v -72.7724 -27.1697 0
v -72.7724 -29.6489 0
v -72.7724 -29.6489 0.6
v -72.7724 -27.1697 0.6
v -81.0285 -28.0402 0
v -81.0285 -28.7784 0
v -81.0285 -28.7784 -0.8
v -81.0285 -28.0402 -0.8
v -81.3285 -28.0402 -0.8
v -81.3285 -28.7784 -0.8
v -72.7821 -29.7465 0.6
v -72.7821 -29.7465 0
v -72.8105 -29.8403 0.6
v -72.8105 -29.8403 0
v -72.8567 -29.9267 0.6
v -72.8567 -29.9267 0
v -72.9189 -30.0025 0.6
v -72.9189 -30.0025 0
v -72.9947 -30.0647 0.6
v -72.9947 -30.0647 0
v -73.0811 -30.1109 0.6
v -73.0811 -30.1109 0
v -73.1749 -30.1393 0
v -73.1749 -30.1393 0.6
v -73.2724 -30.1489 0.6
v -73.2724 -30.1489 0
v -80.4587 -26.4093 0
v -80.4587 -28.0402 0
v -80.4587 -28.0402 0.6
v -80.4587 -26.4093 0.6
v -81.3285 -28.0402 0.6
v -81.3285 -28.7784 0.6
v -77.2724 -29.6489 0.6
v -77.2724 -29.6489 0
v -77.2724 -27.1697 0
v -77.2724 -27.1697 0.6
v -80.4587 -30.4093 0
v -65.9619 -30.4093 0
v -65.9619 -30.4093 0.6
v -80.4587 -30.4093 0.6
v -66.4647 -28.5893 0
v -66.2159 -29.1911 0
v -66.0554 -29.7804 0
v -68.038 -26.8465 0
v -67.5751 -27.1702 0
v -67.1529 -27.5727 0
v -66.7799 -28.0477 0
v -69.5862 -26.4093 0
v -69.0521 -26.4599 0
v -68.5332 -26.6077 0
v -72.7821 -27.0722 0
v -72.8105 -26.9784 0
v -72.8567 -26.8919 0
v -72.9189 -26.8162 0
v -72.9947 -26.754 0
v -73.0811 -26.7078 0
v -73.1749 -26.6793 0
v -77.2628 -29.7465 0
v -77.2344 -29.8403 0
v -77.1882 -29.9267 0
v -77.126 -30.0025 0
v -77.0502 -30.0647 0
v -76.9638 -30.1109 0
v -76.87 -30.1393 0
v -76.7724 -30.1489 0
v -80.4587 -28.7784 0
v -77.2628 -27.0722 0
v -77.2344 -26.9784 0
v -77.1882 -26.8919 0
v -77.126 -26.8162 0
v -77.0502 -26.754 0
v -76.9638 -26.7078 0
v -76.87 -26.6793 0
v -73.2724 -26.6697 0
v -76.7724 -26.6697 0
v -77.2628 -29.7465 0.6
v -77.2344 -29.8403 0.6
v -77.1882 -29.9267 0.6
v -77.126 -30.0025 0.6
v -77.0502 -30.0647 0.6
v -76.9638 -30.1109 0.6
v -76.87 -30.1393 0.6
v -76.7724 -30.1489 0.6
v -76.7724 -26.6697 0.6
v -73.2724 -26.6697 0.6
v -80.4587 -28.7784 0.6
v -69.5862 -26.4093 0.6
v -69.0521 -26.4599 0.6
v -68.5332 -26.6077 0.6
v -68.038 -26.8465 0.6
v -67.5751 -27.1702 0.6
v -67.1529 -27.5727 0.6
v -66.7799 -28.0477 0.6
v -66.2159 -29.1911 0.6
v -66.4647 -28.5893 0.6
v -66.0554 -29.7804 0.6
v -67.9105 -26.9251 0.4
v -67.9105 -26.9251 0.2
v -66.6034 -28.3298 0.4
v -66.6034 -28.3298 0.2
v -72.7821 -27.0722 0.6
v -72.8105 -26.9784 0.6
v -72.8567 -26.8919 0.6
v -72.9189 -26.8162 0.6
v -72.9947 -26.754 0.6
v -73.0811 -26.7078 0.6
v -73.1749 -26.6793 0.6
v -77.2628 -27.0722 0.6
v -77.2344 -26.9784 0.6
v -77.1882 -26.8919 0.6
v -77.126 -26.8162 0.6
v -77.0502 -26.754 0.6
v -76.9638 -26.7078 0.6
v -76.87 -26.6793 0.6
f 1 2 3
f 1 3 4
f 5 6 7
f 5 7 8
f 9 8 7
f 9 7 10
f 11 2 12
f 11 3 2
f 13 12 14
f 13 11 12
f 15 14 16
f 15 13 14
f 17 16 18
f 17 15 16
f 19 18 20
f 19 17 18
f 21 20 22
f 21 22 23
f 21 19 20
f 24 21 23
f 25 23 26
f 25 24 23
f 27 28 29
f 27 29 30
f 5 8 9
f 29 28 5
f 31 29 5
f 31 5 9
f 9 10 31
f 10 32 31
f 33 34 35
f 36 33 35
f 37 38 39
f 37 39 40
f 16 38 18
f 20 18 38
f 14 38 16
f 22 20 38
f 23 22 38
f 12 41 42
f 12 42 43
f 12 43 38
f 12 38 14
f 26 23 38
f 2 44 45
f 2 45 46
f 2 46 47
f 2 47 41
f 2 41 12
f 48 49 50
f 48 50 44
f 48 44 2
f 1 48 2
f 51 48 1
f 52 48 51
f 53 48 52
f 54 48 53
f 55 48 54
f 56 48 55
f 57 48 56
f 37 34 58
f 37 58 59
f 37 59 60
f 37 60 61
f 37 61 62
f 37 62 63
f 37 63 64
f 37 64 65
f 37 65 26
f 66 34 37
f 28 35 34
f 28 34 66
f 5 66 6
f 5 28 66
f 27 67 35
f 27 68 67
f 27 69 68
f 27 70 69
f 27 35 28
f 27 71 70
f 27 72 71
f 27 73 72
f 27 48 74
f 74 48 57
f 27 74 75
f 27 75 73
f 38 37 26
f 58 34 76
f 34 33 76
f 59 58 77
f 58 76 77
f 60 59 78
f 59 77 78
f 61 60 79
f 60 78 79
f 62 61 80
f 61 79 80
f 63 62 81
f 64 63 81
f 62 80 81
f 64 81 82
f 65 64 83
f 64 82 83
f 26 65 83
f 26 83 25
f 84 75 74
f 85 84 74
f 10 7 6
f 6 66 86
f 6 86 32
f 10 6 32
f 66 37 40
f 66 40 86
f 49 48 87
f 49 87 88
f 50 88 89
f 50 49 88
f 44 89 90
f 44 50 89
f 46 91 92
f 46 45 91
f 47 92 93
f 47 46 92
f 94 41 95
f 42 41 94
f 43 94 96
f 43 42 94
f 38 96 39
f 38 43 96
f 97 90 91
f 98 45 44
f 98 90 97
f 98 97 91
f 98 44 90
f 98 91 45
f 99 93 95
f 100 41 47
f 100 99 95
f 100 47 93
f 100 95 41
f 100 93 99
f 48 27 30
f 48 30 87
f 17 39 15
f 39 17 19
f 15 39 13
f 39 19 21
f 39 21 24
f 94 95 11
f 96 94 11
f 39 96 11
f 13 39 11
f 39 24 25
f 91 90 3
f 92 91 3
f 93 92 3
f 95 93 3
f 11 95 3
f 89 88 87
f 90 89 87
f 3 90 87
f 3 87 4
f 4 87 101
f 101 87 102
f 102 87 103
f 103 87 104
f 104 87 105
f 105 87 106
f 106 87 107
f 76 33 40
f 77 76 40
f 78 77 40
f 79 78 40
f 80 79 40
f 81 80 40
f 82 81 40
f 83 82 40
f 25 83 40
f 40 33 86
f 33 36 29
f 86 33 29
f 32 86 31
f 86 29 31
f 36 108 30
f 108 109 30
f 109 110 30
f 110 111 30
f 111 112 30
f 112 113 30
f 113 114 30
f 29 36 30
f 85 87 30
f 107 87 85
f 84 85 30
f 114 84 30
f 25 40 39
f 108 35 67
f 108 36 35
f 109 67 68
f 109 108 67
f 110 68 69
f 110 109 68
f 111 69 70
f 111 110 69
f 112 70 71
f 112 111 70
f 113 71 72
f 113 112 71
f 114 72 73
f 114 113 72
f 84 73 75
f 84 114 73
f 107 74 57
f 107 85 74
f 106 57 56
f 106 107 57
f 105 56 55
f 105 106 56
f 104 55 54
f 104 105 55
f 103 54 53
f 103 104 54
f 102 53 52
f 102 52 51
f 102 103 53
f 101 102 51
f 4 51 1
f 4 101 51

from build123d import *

# Parameters (mm, degrees)
CROQUIS1_W              = 4.5
CROQUIS1_H              = 3.47922044
SALIENTE_EXTRUIR1_DEPTH = 0.6
REDONDEO1_R             = 0.5
CROQUIS2_W              = 0.3
CROQUIS2_H              = 0.738230838
SALIENTE_EXTRUIR2_DEPTH = 0.8


with BuildPart() as part:
    # Croquis1 → Saliente-Extruir1 (new body)
    with BuildSketch(Plane.XY):
        with BuildLine():
            Line((-80.458731062, -26.409325636), (-69.586167188, -26.409325636))
            add(Edge.make_bspline(
                [(-69.586167188, -26.409325636), (-67.825300142, -26.409325636), (-66.171601872, -28.063804878), (-65.9618826, -30.409325636)],
                knots=[0, 0, 0, 0, 1, 1, 1, 1], degree=3))
            Line((-65.9618826, -30.409325636), (-69.586167188, -30.409325636))
            Line((-69.586167188, -30.409325636), (-80.458731062, -30.409325636))
            Line((-80.458731062, -30.409325636), (-80.458731062, -28.778441055))
            Line((-80.458731062, -28.778441055), (-81.328536172, -28.778441055))
            Line((-81.328536172, -28.778441055), (-81.328536172, -28.040210217))
            Line((-81.328536172, -28.040210217), (-80.458731062, -28.040210217))
            Line((-80.458731062, -28.040210217), (-80.458731062, -26.409325636))
        make_face()
        with Locations((-75.022449125, -28.409325636)):
            Rectangle(CROQUIS1_W, CROQUIS1_H, mode=Mode.SUBTRACT)
    extrude(amount=SALIENTE_EXTRUIR1_DEPTH)

    # Redondeo1
    redondeo1_edges = [part.edges().sort_by_distance(p)[0] for p in [
        (-77.272449125, -26.669715416, 0.3),
        (-77.272449125, -30.148935856, 0.3),
        (-72.772449125, -30.148935856, 0.3),
        (-72.772449125, -26.669715416, 0.3),
    ]]
    fillet(redondeo1_edges, radius=REDONDEO1_R)

    # Croquis2 → Saliente-Extruir2 (add)
    with BuildSketch(Plane(origin=(0, 0, 0), x_dir=(-1, 0, 0), z_dir=(0, 0, -1))):
        with Locations((81.178536172, -28.409325636)):
            Rectangle(CROQUIS2_W, CROQUIS2_H)
    extrude(amount=SALIENTE_EXTRUIR2_DEPTH)


solid = part.part
